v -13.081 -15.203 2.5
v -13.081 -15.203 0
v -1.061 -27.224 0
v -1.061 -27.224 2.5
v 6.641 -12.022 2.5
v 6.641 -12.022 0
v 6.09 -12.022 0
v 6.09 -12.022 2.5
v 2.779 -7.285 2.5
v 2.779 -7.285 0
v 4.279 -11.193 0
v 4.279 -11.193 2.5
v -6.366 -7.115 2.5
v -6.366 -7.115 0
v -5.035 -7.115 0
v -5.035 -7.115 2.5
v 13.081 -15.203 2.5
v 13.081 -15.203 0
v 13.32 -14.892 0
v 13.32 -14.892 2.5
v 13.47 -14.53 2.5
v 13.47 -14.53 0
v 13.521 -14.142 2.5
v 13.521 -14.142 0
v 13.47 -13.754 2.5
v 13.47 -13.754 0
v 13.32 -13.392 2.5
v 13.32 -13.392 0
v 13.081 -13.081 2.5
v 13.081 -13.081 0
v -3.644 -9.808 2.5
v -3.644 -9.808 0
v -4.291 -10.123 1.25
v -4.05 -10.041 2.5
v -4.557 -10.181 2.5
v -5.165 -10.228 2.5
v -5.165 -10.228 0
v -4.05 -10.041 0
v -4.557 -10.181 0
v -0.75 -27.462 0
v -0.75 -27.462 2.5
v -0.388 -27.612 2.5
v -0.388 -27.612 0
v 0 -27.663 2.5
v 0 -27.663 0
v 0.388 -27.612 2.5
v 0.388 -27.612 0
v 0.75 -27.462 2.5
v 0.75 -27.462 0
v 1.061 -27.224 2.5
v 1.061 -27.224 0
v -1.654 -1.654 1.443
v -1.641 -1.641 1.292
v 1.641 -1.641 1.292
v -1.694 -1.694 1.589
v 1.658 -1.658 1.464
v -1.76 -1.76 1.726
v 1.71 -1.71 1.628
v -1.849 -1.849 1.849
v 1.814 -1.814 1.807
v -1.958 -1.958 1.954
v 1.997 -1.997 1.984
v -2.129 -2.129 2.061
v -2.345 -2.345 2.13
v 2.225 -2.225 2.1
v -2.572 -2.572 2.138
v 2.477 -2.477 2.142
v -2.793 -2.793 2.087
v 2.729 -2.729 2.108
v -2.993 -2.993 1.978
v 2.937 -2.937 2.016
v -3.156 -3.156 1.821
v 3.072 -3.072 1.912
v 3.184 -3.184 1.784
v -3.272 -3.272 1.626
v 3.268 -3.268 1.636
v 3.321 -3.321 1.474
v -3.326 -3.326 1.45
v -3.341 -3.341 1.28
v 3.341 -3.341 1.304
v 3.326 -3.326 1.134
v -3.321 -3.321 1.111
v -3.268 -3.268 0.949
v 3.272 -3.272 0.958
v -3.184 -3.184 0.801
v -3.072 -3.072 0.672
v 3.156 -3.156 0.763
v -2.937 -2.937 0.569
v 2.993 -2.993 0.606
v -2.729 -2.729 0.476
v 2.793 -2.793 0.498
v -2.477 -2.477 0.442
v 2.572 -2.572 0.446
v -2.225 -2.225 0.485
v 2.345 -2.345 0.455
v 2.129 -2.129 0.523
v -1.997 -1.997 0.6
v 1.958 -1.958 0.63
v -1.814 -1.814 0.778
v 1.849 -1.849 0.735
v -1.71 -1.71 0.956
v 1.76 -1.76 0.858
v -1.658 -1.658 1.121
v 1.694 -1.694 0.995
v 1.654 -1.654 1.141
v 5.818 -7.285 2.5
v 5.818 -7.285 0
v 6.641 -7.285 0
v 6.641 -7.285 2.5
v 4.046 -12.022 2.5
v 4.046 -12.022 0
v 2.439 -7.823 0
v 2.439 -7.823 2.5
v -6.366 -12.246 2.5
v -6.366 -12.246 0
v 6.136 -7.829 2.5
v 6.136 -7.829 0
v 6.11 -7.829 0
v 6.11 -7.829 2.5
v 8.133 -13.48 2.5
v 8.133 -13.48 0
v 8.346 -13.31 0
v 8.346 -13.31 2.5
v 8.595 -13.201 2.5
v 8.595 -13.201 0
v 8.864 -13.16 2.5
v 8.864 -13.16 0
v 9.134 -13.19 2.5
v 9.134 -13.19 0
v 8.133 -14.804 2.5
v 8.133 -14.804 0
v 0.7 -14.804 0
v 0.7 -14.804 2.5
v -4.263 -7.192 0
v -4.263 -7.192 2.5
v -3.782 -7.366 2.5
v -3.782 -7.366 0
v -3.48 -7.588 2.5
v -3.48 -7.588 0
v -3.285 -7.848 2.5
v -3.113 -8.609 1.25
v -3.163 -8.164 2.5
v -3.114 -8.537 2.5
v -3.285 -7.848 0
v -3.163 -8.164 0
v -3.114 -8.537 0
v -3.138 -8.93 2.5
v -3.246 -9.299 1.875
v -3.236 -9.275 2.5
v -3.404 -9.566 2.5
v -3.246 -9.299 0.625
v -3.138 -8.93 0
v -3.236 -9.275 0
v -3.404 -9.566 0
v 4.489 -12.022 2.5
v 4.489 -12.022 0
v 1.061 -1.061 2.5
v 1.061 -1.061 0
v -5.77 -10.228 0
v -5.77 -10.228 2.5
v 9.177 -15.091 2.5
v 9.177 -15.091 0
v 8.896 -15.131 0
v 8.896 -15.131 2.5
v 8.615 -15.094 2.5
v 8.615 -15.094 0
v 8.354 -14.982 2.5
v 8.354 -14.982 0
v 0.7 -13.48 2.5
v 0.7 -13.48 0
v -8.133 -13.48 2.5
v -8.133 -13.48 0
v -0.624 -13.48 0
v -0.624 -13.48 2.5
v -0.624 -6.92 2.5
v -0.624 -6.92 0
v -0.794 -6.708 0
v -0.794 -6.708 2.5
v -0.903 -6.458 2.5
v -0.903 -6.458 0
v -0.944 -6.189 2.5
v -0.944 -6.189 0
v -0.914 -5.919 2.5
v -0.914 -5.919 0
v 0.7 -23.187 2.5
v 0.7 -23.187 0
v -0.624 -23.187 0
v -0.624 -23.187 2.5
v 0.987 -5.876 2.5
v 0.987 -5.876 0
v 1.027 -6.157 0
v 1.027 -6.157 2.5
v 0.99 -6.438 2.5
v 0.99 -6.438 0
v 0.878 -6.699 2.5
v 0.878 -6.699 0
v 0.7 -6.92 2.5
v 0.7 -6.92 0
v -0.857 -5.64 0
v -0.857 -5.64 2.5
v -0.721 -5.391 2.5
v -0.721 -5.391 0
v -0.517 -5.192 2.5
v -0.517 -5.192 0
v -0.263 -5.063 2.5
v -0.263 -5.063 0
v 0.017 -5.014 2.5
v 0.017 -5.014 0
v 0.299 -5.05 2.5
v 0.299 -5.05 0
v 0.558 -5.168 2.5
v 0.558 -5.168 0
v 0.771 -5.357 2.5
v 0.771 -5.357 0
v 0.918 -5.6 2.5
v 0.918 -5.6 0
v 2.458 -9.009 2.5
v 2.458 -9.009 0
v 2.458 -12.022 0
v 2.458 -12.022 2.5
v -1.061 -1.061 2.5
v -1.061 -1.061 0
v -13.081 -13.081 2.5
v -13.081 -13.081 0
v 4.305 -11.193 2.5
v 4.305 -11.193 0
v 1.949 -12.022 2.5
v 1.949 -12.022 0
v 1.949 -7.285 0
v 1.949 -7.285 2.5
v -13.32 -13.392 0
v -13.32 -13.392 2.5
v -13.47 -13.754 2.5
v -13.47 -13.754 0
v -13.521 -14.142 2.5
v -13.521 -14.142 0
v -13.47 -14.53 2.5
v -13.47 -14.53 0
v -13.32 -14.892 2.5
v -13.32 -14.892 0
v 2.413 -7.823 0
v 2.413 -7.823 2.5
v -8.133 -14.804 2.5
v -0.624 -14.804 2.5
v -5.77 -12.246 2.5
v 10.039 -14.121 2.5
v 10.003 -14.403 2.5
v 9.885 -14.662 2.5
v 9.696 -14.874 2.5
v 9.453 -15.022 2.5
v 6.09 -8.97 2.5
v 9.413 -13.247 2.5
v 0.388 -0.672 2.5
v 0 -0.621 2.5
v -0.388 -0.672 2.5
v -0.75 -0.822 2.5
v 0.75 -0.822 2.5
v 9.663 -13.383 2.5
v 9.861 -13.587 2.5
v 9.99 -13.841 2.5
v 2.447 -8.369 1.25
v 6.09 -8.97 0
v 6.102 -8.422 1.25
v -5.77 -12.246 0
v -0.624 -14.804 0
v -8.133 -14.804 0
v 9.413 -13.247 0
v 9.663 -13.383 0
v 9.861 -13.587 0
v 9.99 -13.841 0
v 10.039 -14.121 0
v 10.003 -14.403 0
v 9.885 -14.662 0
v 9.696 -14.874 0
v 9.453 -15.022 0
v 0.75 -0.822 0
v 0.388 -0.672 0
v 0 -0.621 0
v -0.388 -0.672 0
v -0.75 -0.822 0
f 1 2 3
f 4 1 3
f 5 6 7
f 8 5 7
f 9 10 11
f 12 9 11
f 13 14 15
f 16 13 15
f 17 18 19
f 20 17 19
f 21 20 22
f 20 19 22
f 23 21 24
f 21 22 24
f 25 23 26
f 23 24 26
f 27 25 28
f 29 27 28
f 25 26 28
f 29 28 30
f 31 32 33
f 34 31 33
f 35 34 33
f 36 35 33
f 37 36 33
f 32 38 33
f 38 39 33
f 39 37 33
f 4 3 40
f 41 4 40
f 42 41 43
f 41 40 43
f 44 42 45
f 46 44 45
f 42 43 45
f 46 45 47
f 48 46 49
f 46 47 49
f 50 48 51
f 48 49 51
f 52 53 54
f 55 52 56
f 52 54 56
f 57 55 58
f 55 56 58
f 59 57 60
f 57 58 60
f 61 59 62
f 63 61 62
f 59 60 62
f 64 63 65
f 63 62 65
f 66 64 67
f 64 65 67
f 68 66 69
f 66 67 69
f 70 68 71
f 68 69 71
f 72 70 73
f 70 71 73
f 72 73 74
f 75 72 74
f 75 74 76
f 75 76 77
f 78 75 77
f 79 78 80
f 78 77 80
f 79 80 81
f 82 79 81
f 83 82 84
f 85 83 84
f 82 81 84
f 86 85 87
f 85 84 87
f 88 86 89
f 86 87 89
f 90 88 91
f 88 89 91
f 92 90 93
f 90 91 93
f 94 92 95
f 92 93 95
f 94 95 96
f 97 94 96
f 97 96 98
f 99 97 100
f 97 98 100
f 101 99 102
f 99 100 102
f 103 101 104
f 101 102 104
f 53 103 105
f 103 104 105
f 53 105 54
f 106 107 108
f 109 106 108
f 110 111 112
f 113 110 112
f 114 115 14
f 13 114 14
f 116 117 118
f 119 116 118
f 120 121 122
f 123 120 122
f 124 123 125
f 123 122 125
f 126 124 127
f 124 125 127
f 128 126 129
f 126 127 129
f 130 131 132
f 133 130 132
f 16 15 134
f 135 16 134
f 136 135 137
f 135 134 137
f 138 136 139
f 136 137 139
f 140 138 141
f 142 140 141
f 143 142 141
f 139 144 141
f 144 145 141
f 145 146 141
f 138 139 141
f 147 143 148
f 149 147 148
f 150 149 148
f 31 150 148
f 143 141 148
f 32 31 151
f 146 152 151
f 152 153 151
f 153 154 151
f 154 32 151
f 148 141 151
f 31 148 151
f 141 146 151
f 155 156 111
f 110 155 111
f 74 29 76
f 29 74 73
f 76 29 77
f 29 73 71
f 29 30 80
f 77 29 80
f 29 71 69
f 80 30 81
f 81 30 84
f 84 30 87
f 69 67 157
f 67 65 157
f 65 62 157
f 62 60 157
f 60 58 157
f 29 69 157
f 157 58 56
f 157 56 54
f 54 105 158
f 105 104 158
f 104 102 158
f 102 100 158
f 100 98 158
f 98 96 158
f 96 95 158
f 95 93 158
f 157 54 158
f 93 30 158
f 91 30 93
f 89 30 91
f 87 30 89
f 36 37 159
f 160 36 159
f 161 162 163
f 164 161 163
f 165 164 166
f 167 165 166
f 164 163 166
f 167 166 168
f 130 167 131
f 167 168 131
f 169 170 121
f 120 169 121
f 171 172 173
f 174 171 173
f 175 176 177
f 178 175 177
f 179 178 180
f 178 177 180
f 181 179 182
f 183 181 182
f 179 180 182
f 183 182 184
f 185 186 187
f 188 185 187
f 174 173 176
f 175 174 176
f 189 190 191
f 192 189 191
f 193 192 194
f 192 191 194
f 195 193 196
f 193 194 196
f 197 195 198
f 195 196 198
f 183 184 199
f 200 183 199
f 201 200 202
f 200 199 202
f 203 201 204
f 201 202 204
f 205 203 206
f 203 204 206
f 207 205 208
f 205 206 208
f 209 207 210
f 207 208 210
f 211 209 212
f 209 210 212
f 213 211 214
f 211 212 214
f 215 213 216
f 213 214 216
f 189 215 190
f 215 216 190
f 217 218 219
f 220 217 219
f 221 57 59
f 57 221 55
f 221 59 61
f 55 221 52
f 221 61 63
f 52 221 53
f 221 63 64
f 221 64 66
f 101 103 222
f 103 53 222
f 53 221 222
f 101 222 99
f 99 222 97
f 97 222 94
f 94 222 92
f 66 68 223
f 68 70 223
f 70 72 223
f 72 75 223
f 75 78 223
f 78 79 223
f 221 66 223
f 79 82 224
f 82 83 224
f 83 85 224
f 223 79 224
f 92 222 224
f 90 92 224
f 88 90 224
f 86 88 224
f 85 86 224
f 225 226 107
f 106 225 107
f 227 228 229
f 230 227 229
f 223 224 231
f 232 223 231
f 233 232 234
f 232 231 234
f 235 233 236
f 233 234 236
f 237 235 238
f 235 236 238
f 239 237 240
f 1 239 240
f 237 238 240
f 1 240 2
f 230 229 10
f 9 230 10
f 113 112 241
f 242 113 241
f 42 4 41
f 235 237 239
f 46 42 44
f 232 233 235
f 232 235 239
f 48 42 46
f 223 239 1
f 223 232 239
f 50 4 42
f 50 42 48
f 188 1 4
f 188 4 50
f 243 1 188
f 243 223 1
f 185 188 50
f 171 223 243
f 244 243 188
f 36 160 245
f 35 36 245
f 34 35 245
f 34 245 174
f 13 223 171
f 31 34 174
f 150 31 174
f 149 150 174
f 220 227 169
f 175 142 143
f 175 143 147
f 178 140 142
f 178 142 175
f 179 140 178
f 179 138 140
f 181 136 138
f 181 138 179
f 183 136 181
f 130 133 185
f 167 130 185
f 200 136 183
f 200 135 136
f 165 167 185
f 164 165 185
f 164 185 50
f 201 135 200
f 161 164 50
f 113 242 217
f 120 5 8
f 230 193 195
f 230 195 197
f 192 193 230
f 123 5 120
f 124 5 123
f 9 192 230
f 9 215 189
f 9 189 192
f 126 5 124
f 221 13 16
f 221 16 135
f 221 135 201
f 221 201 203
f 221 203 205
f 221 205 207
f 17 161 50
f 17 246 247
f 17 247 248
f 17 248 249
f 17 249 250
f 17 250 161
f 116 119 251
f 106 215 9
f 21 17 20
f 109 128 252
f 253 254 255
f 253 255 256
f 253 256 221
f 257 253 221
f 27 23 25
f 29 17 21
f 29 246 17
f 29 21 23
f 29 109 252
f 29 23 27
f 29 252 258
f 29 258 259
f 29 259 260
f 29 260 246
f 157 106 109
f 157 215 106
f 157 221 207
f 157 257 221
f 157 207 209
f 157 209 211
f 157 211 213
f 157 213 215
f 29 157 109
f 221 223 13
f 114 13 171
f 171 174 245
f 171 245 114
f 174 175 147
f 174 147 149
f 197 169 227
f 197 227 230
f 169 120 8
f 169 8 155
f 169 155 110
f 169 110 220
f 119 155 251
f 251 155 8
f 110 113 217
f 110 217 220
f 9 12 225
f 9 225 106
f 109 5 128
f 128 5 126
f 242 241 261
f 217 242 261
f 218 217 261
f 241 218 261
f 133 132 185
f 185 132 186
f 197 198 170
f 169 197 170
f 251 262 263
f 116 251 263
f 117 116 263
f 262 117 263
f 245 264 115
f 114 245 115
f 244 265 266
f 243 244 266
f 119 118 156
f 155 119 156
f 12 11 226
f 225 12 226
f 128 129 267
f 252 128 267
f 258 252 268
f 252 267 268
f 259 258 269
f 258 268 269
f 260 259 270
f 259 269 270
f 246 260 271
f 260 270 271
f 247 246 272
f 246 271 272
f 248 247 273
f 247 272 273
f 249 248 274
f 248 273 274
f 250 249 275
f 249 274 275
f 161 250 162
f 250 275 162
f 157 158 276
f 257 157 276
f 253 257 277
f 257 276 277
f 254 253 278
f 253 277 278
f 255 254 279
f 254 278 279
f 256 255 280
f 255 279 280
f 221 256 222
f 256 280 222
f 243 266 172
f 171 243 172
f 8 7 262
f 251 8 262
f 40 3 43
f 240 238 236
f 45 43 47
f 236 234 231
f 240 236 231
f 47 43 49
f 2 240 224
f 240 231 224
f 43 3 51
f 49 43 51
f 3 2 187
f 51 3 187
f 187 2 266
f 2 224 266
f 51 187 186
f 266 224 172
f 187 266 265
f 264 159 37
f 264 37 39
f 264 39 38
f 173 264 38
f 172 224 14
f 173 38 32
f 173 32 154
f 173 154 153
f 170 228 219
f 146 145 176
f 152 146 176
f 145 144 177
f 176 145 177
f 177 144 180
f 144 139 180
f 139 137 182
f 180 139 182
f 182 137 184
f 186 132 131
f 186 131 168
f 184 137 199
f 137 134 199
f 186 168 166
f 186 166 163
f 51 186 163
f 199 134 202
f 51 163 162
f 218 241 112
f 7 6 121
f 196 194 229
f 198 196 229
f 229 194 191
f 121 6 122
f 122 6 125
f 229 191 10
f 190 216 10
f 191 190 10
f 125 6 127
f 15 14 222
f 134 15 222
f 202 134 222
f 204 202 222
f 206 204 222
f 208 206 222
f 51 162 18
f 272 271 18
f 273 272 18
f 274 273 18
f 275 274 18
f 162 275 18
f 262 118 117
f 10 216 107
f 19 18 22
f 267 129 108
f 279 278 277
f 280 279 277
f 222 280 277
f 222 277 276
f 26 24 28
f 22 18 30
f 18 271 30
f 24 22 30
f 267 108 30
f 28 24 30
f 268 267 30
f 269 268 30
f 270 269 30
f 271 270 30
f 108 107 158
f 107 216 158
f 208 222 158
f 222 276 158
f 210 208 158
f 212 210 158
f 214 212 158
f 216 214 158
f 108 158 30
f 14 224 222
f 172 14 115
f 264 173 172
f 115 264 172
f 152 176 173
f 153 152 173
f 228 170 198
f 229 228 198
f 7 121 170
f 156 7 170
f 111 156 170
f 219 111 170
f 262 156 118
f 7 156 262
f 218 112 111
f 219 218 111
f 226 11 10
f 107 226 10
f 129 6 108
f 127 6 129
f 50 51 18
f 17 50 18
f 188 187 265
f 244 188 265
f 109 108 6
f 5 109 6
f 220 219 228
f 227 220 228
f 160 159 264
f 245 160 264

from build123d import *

# Parameters (mm, degrees)
F1_DEPTH = 2.5
F2_R     = 0.85
F3_DEPTH = 12.5


with BuildPart() as f1:
    # F0 (on Top) → F1 (new body)
    with BuildSketch(Plane.XY):
        with BuildLine():
            Line((13.081475452, -13.081475452), (1.0606601718, -1.0606601718))
            ThreePointArc((1.0606601718, -1.0606601718), (0, -0.6213203436), (-1.0606601718, -1.0606601718))
            Line((-1.0606601718, -1.0606601718), (-13.081475452, -13.081475452))
            ThreePointArc((-13.081475452, -13.081475452), (-13.5208152802, -14.1421356237), (-13.081475452, -15.2027957955))
            Line((-13.081475452, -15.2027957955), (-1.0606601718, -27.2236110757))
            ThreePointArc((-1.0606601718, -27.2236110757), (0, -27.6629509039), (1.0606601718, -27.2236110757))
            Line((1.0606601718, -27.2236110757), (13.081475452, -15.2027957955))
            ThreePointArc((13.081475452, -15.2027957955), (13.5208152802, -14.1421356237), (13.081475452, -13.081475452))
        make_face()
        with BuildLine():
            add(Edge.make_bspline(
                [(-5.0351947703, -7.1148621023), (-3.1127377117, -7.1148621023), (-3.1127377117, -8.6094826309)],
                knots=[0, 0, 0, 1, 1, 1], degree=2))
            add(Edge.make_bspline(
                [(-3.1127377117, -8.6094826309), (-3.1127377117, -9.3887964152), (-3.6444453152, -9.8082109662)],
                knots=[0, 0, 0, 1, 1, 1], degree=2))
            add(Edge.make_bspline(
                [(-3.6444453152, -9.8082109662), (-4.1761529188, -10.2276255173), (-5.1654547112, -10.2276255173)],
                knots=[0, 0, 0, 1, 1, 1], degree=2))
            Line((-5.1654547112, -10.2276255173), (-5.7695913335, -10.2276255173))
            Line((-5.7695913335, -10.2276255173), (-5.7695913335, -12.2455316704))
            Line((-5.7695913335, -12.2455316704), (-6.3658674423, -12.2455316704))
            Line((-6.3658674423, -12.2455316704), (-6.3658674423, -7.1148621023))
            Line((-6.3658674423, -7.1148621023), (-5.0351947703, -7.1148621023))
        make_face(mode=Mode.SUBTRACT)
        with BuildLine():
            Line((-8.1334756687, -14.8039748892), (-8.1334756687, -13.4802963582))
            Line((-8.1334756687, -13.4802963582), (-0.6236797201, -13.4802963582))
            Line((-0.6236797201, -13.4802963582), (-0.6236797201, -6.9198086858))
            ThreePointArc((-0.6236797201, -6.9198086858), (-0.9032194318, -6.4583786209), (-0.9135835525, -5.9189782686))
            ThreePointArc((-0.9135835525, -5.9189782686), (0.0168397474, -5.0141534426), (0.9868078824, -5.876451129))
            ThreePointArc((0.9868078824, -5.876451129), (0.9900106564, -6.4384308628), (0.6999988109, -6.9198086858))
            Line((0.6999988109, -6.9198086858), (0.6999988109, -13.4802963582))
            Line((0.6999988109, -13.4802963582), (8.1334756687, -13.4802963582))
            ThreePointArc((8.1334756687, -13.4802963582), (8.5949057336, -13.2007566465), (9.134306086, -13.1903925258))
            ThreePointArc((9.134306086, -13.1903925258), (10.0391309119, -14.1208158258), (9.1768332255, -15.0907839607))
            ThreePointArc((9.1768332255, -15.0907839607), (8.6148534917, -15.0939867347), (8.1334756687, -14.8039748892))
            Line((8.1334756687, -14.8039748892), (0.6999988109, -14.8039748892))
            Line((0.6999988109, -14.8039748892), (0.6999988109, -23.1867600232))
            Line((0.6999988109, -23.1867600232), (-0.6236797201, -23.1867600232))
            Line((-0.6236797201, -23.1867600232), (-0.6236797201, -14.8039748892))
            Line((-0.6236797201, -14.8039748892), (-8.1334756687, -14.8039748892))
        make_face(mode=Mode.SUBTRACT)
        with BuildLine():
            Line((4.4893827087, -12.0222926794), (4.0456231809, -12.0222926794))
            Line((4.0456231809, -12.0222926794), (2.4385501247, -7.8231663068))
            Line((2.4385501247, -7.8231663068), (2.4126295915, -7.8231663068))
            add(Edge.make_bspline(
                [(2.4126295915, -7.8231663068), (2.4582497299, -8.3218773648), (2.4582497299, -9.0092899044)],
                knots=[0, 0, 0, 1, 1, 1], degree=2))
            Line((2.4582497299, -9.0092899044), (2.4582497299, -12.0222926794))
            Line((2.4582497299, -12.0222926794), (1.9491704586, -12.0222926794))
            Line((1.9491704586, -12.0222926794), (1.9491704586, -7.2850560383))
            Line((1.9491704586, -7.2850560383), (2.7786275198, -7.2850560383))
            Line((2.7786275198, -7.2850560383), (4.2789079794, -11.1928356181))
            Line((4.2789079794, -11.1928356181), (4.3048285126, -11.1928356181))
            Line((4.3048285126, -11.1928356181), (5.817550828, -7.2850560383))
            Line((5.817550828, -7.2850560383), (6.6407869613, -7.2850560383))
            Line((6.6407869613, -7.2850560383), (6.6407869613, -12.0222926794))
            Line((6.6407869613, -12.0222926794), (6.0902348369, -12.0222926794))
            Line((6.0902348369, -12.0222926794), (6.0902348369, -8.969890694))
            add(Edge.make_bspline(
                [(6.0902348369, -8.969890694), (6.0902348369, -8.4452591027), (6.1358549753, -7.8293872347)],
                knots=[0, 0, 0, 1, 1, 1], degree=2))
            Line((6.1358549753, -7.8293872347), (6.1099344421, -7.8293872347))
            Line((6.1099344421, -7.8293872347), (4.4893827087, -12.0222926794))
        make_face(mode=Mode.SUBTRACT)
    extrude(amount=F1_DEPTH)

    # F2 (on Right) → F3 (cut, symmetric)
    with BuildSketch(Plane.YZ):
        with Locations((-2.4908210296, 1.292226194)):
            Circle(F2_R)
    extrude(amount=F3_DEPTH, both=True, mode=Mode.SUBTRACT)


solid = f1.part
